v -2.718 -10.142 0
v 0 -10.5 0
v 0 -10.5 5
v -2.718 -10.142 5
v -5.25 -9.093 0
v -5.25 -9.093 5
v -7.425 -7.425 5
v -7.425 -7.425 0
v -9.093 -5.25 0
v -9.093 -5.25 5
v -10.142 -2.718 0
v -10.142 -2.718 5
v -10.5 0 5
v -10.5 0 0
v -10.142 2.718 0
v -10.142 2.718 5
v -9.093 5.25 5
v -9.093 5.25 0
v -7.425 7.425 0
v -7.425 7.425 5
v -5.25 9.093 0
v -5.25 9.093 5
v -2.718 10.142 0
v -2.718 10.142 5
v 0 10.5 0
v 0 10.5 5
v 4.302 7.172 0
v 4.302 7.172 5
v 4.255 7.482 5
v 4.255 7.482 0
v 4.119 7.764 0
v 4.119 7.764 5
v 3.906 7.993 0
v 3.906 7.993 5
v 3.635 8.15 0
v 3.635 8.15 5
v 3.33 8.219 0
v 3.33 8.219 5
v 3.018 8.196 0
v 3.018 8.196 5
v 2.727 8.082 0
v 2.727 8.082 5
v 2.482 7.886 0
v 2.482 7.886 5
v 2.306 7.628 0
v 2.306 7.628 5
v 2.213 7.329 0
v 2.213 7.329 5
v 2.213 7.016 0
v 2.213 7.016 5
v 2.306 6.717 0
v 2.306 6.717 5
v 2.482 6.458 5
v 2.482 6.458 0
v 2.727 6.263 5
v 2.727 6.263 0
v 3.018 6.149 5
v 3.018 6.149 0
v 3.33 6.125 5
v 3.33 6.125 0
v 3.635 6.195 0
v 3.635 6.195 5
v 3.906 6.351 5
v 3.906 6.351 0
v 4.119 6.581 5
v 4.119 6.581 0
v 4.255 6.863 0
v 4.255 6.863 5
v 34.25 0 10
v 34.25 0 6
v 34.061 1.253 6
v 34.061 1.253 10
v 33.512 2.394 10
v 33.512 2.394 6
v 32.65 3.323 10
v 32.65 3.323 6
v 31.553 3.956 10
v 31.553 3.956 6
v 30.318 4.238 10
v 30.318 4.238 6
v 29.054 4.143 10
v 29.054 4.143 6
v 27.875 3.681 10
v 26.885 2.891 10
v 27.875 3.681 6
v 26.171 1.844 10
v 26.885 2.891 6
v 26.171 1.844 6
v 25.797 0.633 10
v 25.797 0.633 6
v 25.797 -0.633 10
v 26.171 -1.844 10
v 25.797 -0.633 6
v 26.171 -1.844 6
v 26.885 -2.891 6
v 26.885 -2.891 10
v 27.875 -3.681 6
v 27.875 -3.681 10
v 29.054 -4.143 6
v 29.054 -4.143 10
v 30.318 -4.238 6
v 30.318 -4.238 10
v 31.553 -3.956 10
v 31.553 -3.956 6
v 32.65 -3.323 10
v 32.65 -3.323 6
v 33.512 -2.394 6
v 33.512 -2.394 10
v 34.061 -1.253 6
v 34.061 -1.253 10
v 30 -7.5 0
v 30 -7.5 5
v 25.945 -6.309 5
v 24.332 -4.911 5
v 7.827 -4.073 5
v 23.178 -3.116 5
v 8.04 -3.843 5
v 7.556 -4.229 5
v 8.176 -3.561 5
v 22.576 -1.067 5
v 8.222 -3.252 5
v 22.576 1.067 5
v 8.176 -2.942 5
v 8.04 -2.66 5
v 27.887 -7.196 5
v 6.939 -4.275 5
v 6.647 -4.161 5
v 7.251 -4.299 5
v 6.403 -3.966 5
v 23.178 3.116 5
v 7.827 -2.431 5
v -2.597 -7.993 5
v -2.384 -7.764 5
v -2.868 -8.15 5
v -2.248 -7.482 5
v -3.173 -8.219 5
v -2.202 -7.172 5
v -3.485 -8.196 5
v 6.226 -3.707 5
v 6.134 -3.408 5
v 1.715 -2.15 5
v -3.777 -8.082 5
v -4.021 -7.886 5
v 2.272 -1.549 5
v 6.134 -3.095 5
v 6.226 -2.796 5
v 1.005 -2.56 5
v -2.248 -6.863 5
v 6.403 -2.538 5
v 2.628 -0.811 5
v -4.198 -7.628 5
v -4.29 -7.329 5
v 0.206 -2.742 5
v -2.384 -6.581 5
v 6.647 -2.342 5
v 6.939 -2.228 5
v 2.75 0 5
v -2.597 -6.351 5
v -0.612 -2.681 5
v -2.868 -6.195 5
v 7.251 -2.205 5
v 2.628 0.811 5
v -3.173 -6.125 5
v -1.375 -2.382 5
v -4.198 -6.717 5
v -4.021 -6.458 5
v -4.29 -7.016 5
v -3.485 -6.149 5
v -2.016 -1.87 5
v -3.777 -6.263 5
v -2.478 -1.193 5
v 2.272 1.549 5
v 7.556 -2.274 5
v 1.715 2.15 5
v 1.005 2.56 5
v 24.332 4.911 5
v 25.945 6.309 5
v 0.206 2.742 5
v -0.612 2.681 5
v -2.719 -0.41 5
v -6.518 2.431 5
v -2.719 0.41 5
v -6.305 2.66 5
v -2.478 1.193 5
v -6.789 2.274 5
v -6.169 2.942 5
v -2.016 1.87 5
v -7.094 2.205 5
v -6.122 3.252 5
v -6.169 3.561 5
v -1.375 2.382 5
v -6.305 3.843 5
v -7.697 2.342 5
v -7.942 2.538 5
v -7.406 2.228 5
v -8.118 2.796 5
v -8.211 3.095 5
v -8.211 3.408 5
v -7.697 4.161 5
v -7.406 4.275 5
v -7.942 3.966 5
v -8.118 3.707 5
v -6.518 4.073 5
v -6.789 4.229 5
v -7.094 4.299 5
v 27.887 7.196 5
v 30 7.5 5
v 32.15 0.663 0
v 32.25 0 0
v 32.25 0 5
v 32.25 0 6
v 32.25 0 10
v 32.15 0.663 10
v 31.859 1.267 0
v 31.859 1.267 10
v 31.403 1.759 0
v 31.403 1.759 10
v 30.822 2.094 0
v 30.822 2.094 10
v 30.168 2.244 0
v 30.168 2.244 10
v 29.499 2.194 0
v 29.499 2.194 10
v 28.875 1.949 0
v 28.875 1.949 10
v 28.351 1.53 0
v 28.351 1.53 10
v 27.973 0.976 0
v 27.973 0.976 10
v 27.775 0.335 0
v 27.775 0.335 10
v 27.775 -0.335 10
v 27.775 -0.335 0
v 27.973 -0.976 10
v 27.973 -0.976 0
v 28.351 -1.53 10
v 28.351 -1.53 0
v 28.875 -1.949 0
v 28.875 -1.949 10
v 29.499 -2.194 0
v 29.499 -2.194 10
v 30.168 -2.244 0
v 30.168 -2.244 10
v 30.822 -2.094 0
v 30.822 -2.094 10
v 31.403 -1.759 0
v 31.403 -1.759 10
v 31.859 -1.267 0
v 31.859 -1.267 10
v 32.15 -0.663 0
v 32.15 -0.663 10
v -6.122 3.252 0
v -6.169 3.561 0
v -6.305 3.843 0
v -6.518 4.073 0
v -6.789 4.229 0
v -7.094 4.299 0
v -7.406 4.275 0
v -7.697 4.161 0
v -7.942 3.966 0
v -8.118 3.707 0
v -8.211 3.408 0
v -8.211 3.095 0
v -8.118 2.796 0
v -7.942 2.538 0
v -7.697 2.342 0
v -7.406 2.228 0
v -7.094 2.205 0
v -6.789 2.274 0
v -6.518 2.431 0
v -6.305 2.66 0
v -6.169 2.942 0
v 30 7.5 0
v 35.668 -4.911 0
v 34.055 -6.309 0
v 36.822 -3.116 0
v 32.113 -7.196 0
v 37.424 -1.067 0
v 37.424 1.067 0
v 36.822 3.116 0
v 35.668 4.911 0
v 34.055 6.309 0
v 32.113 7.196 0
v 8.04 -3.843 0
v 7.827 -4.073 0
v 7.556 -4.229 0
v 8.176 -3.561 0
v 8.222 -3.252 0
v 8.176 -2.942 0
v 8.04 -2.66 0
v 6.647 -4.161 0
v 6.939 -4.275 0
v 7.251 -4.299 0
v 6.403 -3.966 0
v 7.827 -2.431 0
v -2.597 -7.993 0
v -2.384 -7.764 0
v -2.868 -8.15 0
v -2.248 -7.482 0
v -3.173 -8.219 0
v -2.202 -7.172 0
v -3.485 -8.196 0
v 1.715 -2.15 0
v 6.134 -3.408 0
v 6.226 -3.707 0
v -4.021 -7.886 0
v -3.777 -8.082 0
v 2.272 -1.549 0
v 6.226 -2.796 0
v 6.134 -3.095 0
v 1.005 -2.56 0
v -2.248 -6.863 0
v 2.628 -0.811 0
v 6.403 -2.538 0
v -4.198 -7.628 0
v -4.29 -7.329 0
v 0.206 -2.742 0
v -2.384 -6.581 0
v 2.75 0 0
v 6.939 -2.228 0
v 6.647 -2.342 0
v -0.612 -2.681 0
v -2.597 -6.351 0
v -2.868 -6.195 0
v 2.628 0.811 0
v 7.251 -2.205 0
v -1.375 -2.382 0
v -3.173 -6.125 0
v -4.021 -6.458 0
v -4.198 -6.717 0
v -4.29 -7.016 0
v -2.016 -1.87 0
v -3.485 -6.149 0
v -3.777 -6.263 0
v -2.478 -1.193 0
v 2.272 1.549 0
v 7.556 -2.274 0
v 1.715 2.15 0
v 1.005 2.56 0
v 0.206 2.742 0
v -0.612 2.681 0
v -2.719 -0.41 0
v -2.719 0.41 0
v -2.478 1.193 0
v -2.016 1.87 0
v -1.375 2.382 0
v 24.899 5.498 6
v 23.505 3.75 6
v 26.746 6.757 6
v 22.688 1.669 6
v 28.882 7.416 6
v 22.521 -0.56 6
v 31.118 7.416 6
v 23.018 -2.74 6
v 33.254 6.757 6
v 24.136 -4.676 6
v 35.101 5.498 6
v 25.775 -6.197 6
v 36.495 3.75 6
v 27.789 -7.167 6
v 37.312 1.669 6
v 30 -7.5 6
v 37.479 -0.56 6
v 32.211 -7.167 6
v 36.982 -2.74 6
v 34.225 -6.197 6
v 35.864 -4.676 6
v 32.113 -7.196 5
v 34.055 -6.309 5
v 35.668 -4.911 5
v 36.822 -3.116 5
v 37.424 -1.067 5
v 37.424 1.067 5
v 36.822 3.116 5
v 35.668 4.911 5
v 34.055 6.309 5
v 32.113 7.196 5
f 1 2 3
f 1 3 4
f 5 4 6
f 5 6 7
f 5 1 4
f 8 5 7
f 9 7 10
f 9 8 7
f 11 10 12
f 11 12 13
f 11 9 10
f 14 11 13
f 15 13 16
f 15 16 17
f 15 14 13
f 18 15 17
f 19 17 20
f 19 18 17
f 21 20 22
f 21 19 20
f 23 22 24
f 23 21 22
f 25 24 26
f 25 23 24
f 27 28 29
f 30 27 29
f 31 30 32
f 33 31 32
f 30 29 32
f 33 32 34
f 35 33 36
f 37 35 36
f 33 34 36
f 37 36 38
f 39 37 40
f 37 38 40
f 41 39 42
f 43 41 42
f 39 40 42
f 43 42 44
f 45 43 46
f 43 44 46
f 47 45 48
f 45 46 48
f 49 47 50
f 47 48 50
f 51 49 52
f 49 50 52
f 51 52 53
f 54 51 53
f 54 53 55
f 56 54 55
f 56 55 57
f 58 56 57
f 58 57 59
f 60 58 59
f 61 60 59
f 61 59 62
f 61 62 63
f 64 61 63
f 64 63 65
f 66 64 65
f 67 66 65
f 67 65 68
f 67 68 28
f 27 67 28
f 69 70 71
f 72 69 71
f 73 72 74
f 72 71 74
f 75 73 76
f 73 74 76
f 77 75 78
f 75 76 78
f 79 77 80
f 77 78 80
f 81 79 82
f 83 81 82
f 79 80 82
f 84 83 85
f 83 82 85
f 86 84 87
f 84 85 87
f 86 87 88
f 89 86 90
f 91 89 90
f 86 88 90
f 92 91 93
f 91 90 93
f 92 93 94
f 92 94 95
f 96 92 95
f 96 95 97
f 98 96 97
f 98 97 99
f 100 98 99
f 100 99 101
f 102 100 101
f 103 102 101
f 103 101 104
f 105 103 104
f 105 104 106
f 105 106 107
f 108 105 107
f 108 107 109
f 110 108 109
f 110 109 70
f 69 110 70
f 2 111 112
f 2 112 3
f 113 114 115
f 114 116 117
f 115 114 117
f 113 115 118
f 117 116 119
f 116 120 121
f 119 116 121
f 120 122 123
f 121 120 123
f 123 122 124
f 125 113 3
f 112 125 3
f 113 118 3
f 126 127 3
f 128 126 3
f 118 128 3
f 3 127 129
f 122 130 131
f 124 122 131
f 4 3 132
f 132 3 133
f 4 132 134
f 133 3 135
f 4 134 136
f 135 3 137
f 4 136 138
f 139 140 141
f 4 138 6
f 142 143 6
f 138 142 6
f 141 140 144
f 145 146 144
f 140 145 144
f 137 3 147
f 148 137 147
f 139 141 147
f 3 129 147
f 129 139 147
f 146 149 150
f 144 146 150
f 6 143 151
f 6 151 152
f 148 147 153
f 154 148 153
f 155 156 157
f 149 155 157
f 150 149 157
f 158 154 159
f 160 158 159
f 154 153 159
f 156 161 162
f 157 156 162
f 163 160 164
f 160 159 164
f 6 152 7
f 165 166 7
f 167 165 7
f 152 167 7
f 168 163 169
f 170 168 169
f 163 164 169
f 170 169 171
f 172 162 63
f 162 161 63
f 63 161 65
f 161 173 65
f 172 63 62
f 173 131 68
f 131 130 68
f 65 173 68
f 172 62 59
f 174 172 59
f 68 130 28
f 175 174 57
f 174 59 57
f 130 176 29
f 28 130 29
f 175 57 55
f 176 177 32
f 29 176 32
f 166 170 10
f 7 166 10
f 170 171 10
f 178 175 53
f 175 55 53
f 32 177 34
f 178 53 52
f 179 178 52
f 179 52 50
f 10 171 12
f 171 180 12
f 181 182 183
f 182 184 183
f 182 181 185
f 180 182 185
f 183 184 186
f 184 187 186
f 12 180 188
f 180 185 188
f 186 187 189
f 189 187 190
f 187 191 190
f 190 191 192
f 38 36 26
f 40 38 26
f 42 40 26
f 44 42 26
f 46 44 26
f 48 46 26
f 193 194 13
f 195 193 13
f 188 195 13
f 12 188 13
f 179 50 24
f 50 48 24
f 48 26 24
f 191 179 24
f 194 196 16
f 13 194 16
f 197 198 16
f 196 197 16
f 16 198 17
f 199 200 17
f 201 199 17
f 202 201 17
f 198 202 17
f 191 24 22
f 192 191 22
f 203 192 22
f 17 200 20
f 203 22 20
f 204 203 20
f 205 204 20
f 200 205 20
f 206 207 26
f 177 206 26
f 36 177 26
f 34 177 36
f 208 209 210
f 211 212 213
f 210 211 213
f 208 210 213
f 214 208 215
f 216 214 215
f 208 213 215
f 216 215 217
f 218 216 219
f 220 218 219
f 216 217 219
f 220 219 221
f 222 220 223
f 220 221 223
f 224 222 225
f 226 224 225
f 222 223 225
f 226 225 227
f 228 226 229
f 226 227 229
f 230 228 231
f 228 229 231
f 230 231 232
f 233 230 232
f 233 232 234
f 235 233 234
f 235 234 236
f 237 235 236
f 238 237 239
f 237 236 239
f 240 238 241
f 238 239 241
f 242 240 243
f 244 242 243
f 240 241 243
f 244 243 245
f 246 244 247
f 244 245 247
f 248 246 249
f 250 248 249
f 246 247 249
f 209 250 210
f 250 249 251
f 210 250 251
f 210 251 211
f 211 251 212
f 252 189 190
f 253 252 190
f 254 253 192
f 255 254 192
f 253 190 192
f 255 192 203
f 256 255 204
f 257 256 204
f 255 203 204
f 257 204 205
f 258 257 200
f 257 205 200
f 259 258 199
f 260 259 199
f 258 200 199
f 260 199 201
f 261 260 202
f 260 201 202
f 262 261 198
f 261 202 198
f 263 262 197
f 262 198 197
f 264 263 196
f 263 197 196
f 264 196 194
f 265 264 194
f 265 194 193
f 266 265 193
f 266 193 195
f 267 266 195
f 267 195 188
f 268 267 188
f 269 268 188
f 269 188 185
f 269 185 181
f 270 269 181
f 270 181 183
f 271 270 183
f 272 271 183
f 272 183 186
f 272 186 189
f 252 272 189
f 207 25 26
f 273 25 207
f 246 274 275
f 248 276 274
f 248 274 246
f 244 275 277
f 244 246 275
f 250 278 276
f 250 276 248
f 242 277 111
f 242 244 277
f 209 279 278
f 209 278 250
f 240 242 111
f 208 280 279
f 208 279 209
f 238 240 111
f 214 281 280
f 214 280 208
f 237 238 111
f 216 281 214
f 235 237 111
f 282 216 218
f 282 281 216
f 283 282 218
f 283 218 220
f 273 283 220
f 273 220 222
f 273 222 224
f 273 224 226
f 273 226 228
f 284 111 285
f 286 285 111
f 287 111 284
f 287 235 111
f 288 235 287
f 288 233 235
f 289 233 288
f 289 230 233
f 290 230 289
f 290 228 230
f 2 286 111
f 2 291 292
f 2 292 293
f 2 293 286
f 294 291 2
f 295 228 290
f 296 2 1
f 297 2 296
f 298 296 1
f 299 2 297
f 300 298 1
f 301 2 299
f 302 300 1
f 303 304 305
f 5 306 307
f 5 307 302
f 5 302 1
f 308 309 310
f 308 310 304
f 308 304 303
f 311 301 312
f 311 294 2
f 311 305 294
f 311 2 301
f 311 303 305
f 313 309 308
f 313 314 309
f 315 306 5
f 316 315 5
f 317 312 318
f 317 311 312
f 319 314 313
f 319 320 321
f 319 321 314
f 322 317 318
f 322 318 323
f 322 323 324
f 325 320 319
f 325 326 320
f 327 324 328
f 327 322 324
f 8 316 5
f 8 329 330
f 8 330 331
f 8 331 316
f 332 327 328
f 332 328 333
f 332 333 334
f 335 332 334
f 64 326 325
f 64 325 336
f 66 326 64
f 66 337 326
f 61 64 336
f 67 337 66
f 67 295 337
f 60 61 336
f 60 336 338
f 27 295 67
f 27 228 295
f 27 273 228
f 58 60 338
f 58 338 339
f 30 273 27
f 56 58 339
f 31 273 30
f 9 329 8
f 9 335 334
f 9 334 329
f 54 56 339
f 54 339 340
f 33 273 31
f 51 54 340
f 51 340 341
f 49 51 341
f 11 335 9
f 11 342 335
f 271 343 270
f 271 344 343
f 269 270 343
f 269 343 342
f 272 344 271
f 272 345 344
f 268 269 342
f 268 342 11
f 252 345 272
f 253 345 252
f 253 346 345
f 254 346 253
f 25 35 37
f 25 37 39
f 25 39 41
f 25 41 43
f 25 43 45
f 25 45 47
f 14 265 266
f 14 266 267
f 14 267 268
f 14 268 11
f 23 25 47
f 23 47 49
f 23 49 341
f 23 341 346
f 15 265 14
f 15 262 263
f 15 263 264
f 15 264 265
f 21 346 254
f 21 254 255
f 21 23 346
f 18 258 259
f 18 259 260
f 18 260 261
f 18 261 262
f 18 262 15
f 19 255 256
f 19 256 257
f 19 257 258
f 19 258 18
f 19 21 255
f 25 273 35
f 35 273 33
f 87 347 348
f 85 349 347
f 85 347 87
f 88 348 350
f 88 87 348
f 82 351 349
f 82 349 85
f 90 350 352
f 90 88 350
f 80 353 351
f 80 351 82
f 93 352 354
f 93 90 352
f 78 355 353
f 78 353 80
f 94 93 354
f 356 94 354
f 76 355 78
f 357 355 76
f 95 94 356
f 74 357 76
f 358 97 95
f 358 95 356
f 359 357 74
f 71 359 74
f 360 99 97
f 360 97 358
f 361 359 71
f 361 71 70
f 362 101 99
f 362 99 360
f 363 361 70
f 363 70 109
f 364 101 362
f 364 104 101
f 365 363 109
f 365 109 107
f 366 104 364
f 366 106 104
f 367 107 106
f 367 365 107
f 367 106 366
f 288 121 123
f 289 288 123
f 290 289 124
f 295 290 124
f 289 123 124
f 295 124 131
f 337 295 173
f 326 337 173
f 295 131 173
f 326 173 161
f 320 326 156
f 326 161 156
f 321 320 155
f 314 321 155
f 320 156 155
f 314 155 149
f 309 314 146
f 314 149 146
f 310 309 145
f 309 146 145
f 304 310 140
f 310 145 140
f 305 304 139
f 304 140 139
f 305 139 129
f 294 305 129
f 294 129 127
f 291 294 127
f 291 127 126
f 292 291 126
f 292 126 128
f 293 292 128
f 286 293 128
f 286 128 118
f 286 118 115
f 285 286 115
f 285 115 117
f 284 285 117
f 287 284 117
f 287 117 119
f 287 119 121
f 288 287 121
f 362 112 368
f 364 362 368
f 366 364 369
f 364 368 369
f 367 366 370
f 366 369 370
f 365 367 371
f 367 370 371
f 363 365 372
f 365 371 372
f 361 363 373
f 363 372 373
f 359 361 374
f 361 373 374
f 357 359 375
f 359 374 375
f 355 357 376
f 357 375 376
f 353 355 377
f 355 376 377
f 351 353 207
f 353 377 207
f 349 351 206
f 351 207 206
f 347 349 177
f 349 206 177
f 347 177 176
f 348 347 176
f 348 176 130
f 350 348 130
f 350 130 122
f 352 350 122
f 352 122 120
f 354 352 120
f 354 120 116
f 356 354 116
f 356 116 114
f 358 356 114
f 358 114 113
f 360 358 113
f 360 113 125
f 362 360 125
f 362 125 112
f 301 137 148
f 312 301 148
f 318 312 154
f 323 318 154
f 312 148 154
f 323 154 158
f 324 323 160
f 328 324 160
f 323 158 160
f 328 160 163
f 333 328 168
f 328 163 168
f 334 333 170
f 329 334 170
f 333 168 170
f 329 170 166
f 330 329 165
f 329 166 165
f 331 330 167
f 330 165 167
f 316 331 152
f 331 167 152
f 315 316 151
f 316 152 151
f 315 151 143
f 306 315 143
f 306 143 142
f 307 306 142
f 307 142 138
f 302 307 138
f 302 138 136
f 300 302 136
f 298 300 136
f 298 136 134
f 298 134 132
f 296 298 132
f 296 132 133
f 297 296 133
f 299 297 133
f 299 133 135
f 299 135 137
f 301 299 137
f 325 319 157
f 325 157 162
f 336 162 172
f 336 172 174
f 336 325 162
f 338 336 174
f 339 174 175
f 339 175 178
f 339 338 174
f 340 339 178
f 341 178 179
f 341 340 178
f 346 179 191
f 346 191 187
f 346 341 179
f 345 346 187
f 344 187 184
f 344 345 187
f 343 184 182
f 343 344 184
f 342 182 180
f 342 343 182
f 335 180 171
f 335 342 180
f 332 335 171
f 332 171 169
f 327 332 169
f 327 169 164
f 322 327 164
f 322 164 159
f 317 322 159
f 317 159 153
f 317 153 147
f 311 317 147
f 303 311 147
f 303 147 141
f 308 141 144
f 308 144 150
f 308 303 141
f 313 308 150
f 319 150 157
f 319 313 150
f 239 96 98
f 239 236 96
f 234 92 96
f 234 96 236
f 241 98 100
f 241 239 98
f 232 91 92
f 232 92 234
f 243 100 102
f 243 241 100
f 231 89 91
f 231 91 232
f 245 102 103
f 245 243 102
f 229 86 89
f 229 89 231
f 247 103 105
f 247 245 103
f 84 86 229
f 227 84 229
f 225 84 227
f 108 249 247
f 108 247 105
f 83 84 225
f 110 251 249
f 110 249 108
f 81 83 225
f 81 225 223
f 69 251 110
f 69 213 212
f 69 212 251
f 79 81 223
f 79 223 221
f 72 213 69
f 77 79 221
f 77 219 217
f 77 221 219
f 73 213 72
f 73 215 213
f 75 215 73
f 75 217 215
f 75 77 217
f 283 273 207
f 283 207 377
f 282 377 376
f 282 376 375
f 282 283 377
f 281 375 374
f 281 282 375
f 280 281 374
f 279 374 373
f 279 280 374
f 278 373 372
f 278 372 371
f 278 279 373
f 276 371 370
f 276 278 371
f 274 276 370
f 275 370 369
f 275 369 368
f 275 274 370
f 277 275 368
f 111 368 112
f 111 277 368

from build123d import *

# Parameters (mm, degrees)
SKETCH_1_R           = 2.75
EXTRUDE_1_DEPTH      = 5
SKETCH_2_R           = 4.250000000000005
EXTRUDE_2_DEPTH      = 5
SKETCH_3_R           = 2.250000000000002
CUT_EXTRUDE_1_DEPTH  = 40.00000000000001
HOLE_WIZARD_M1_8_1_D = 2.1
SKETCH_8_R           = 7.499999999835785
SKETCH_8_R_2         = 2.249999999836049
EXTRUDE_3_DEPTH      = 1


with BuildPart() as part:
    # 스케치1 → 보스-돌출1 (new body)
    with BuildSketch(Plane.XY):
        with BuildLine():
            Line((2.51e-15, 10.5), (30, 7.5))
            ThreePointArc((30, 7.5), (37.5, 0), (30, -7.5))
            Line((30, -7.5), (2.51e-15, -10.5))
            ThreePointArc((2.51e-15, -10.5), (-10.5, 1.29e-15), (2.51e-15, 10.5))
        make_face()
        Circle(SKETCH_1_R, mode=Mode.SUBTRACT)
    extrude(amount=EXTRUDE_1_DEPTH)

    # 스케치2 → 보스-돌출2 (add)
    with BuildSketch(Plane.XY.offset(5)):
        with Locations((30, 0)):
            Circle(SKETCH_2_R)
    extrude(amount=EXTRUDE_2_DEPTH)

    # 스케치3 → 컷-돌출1 (cut)
    with BuildSketch(Plane.XY.offset(10)):
        with Locations((30, 0)):
            Circle(SKETCH_3_R)
    extrude(amount=-CUT_EXTRUDE_1_DEPTH, mode=Mode.SUBTRACT)

    # M1.8 여유 구멍1 (through all)
    with Locations(Plane(origin=(0, 0, 0), x_dir=(-1, 0, 0), z_dir=(0, 0, -1))):
        with Locations((-7.172291773, -3.251754556), (3.251754556, -7.172291774), (7.172291774, 3.251754554), (-3.251754555, 7.172291773)):
            Hole(HOLE_WIZARD_M1_8_1_D / 2)

    # 스케치8 → 보스-돌출3 (add)
    with BuildSketch(Plane.XY.offset(5)):
        with Locations(Location((30.000000000162284, 3.18634e-11, 0), (0, 0, 269.999999996))):
            Circle(SKETCH_8_R)
        with Locations((30.000000000162284, 3.18634e-11)):
            Circle(SKETCH_8_R_2, mode=Mode.SUBTRACT)
    extrude(amount=EXTRUDE_3_DEPTH)


solid = part.part
